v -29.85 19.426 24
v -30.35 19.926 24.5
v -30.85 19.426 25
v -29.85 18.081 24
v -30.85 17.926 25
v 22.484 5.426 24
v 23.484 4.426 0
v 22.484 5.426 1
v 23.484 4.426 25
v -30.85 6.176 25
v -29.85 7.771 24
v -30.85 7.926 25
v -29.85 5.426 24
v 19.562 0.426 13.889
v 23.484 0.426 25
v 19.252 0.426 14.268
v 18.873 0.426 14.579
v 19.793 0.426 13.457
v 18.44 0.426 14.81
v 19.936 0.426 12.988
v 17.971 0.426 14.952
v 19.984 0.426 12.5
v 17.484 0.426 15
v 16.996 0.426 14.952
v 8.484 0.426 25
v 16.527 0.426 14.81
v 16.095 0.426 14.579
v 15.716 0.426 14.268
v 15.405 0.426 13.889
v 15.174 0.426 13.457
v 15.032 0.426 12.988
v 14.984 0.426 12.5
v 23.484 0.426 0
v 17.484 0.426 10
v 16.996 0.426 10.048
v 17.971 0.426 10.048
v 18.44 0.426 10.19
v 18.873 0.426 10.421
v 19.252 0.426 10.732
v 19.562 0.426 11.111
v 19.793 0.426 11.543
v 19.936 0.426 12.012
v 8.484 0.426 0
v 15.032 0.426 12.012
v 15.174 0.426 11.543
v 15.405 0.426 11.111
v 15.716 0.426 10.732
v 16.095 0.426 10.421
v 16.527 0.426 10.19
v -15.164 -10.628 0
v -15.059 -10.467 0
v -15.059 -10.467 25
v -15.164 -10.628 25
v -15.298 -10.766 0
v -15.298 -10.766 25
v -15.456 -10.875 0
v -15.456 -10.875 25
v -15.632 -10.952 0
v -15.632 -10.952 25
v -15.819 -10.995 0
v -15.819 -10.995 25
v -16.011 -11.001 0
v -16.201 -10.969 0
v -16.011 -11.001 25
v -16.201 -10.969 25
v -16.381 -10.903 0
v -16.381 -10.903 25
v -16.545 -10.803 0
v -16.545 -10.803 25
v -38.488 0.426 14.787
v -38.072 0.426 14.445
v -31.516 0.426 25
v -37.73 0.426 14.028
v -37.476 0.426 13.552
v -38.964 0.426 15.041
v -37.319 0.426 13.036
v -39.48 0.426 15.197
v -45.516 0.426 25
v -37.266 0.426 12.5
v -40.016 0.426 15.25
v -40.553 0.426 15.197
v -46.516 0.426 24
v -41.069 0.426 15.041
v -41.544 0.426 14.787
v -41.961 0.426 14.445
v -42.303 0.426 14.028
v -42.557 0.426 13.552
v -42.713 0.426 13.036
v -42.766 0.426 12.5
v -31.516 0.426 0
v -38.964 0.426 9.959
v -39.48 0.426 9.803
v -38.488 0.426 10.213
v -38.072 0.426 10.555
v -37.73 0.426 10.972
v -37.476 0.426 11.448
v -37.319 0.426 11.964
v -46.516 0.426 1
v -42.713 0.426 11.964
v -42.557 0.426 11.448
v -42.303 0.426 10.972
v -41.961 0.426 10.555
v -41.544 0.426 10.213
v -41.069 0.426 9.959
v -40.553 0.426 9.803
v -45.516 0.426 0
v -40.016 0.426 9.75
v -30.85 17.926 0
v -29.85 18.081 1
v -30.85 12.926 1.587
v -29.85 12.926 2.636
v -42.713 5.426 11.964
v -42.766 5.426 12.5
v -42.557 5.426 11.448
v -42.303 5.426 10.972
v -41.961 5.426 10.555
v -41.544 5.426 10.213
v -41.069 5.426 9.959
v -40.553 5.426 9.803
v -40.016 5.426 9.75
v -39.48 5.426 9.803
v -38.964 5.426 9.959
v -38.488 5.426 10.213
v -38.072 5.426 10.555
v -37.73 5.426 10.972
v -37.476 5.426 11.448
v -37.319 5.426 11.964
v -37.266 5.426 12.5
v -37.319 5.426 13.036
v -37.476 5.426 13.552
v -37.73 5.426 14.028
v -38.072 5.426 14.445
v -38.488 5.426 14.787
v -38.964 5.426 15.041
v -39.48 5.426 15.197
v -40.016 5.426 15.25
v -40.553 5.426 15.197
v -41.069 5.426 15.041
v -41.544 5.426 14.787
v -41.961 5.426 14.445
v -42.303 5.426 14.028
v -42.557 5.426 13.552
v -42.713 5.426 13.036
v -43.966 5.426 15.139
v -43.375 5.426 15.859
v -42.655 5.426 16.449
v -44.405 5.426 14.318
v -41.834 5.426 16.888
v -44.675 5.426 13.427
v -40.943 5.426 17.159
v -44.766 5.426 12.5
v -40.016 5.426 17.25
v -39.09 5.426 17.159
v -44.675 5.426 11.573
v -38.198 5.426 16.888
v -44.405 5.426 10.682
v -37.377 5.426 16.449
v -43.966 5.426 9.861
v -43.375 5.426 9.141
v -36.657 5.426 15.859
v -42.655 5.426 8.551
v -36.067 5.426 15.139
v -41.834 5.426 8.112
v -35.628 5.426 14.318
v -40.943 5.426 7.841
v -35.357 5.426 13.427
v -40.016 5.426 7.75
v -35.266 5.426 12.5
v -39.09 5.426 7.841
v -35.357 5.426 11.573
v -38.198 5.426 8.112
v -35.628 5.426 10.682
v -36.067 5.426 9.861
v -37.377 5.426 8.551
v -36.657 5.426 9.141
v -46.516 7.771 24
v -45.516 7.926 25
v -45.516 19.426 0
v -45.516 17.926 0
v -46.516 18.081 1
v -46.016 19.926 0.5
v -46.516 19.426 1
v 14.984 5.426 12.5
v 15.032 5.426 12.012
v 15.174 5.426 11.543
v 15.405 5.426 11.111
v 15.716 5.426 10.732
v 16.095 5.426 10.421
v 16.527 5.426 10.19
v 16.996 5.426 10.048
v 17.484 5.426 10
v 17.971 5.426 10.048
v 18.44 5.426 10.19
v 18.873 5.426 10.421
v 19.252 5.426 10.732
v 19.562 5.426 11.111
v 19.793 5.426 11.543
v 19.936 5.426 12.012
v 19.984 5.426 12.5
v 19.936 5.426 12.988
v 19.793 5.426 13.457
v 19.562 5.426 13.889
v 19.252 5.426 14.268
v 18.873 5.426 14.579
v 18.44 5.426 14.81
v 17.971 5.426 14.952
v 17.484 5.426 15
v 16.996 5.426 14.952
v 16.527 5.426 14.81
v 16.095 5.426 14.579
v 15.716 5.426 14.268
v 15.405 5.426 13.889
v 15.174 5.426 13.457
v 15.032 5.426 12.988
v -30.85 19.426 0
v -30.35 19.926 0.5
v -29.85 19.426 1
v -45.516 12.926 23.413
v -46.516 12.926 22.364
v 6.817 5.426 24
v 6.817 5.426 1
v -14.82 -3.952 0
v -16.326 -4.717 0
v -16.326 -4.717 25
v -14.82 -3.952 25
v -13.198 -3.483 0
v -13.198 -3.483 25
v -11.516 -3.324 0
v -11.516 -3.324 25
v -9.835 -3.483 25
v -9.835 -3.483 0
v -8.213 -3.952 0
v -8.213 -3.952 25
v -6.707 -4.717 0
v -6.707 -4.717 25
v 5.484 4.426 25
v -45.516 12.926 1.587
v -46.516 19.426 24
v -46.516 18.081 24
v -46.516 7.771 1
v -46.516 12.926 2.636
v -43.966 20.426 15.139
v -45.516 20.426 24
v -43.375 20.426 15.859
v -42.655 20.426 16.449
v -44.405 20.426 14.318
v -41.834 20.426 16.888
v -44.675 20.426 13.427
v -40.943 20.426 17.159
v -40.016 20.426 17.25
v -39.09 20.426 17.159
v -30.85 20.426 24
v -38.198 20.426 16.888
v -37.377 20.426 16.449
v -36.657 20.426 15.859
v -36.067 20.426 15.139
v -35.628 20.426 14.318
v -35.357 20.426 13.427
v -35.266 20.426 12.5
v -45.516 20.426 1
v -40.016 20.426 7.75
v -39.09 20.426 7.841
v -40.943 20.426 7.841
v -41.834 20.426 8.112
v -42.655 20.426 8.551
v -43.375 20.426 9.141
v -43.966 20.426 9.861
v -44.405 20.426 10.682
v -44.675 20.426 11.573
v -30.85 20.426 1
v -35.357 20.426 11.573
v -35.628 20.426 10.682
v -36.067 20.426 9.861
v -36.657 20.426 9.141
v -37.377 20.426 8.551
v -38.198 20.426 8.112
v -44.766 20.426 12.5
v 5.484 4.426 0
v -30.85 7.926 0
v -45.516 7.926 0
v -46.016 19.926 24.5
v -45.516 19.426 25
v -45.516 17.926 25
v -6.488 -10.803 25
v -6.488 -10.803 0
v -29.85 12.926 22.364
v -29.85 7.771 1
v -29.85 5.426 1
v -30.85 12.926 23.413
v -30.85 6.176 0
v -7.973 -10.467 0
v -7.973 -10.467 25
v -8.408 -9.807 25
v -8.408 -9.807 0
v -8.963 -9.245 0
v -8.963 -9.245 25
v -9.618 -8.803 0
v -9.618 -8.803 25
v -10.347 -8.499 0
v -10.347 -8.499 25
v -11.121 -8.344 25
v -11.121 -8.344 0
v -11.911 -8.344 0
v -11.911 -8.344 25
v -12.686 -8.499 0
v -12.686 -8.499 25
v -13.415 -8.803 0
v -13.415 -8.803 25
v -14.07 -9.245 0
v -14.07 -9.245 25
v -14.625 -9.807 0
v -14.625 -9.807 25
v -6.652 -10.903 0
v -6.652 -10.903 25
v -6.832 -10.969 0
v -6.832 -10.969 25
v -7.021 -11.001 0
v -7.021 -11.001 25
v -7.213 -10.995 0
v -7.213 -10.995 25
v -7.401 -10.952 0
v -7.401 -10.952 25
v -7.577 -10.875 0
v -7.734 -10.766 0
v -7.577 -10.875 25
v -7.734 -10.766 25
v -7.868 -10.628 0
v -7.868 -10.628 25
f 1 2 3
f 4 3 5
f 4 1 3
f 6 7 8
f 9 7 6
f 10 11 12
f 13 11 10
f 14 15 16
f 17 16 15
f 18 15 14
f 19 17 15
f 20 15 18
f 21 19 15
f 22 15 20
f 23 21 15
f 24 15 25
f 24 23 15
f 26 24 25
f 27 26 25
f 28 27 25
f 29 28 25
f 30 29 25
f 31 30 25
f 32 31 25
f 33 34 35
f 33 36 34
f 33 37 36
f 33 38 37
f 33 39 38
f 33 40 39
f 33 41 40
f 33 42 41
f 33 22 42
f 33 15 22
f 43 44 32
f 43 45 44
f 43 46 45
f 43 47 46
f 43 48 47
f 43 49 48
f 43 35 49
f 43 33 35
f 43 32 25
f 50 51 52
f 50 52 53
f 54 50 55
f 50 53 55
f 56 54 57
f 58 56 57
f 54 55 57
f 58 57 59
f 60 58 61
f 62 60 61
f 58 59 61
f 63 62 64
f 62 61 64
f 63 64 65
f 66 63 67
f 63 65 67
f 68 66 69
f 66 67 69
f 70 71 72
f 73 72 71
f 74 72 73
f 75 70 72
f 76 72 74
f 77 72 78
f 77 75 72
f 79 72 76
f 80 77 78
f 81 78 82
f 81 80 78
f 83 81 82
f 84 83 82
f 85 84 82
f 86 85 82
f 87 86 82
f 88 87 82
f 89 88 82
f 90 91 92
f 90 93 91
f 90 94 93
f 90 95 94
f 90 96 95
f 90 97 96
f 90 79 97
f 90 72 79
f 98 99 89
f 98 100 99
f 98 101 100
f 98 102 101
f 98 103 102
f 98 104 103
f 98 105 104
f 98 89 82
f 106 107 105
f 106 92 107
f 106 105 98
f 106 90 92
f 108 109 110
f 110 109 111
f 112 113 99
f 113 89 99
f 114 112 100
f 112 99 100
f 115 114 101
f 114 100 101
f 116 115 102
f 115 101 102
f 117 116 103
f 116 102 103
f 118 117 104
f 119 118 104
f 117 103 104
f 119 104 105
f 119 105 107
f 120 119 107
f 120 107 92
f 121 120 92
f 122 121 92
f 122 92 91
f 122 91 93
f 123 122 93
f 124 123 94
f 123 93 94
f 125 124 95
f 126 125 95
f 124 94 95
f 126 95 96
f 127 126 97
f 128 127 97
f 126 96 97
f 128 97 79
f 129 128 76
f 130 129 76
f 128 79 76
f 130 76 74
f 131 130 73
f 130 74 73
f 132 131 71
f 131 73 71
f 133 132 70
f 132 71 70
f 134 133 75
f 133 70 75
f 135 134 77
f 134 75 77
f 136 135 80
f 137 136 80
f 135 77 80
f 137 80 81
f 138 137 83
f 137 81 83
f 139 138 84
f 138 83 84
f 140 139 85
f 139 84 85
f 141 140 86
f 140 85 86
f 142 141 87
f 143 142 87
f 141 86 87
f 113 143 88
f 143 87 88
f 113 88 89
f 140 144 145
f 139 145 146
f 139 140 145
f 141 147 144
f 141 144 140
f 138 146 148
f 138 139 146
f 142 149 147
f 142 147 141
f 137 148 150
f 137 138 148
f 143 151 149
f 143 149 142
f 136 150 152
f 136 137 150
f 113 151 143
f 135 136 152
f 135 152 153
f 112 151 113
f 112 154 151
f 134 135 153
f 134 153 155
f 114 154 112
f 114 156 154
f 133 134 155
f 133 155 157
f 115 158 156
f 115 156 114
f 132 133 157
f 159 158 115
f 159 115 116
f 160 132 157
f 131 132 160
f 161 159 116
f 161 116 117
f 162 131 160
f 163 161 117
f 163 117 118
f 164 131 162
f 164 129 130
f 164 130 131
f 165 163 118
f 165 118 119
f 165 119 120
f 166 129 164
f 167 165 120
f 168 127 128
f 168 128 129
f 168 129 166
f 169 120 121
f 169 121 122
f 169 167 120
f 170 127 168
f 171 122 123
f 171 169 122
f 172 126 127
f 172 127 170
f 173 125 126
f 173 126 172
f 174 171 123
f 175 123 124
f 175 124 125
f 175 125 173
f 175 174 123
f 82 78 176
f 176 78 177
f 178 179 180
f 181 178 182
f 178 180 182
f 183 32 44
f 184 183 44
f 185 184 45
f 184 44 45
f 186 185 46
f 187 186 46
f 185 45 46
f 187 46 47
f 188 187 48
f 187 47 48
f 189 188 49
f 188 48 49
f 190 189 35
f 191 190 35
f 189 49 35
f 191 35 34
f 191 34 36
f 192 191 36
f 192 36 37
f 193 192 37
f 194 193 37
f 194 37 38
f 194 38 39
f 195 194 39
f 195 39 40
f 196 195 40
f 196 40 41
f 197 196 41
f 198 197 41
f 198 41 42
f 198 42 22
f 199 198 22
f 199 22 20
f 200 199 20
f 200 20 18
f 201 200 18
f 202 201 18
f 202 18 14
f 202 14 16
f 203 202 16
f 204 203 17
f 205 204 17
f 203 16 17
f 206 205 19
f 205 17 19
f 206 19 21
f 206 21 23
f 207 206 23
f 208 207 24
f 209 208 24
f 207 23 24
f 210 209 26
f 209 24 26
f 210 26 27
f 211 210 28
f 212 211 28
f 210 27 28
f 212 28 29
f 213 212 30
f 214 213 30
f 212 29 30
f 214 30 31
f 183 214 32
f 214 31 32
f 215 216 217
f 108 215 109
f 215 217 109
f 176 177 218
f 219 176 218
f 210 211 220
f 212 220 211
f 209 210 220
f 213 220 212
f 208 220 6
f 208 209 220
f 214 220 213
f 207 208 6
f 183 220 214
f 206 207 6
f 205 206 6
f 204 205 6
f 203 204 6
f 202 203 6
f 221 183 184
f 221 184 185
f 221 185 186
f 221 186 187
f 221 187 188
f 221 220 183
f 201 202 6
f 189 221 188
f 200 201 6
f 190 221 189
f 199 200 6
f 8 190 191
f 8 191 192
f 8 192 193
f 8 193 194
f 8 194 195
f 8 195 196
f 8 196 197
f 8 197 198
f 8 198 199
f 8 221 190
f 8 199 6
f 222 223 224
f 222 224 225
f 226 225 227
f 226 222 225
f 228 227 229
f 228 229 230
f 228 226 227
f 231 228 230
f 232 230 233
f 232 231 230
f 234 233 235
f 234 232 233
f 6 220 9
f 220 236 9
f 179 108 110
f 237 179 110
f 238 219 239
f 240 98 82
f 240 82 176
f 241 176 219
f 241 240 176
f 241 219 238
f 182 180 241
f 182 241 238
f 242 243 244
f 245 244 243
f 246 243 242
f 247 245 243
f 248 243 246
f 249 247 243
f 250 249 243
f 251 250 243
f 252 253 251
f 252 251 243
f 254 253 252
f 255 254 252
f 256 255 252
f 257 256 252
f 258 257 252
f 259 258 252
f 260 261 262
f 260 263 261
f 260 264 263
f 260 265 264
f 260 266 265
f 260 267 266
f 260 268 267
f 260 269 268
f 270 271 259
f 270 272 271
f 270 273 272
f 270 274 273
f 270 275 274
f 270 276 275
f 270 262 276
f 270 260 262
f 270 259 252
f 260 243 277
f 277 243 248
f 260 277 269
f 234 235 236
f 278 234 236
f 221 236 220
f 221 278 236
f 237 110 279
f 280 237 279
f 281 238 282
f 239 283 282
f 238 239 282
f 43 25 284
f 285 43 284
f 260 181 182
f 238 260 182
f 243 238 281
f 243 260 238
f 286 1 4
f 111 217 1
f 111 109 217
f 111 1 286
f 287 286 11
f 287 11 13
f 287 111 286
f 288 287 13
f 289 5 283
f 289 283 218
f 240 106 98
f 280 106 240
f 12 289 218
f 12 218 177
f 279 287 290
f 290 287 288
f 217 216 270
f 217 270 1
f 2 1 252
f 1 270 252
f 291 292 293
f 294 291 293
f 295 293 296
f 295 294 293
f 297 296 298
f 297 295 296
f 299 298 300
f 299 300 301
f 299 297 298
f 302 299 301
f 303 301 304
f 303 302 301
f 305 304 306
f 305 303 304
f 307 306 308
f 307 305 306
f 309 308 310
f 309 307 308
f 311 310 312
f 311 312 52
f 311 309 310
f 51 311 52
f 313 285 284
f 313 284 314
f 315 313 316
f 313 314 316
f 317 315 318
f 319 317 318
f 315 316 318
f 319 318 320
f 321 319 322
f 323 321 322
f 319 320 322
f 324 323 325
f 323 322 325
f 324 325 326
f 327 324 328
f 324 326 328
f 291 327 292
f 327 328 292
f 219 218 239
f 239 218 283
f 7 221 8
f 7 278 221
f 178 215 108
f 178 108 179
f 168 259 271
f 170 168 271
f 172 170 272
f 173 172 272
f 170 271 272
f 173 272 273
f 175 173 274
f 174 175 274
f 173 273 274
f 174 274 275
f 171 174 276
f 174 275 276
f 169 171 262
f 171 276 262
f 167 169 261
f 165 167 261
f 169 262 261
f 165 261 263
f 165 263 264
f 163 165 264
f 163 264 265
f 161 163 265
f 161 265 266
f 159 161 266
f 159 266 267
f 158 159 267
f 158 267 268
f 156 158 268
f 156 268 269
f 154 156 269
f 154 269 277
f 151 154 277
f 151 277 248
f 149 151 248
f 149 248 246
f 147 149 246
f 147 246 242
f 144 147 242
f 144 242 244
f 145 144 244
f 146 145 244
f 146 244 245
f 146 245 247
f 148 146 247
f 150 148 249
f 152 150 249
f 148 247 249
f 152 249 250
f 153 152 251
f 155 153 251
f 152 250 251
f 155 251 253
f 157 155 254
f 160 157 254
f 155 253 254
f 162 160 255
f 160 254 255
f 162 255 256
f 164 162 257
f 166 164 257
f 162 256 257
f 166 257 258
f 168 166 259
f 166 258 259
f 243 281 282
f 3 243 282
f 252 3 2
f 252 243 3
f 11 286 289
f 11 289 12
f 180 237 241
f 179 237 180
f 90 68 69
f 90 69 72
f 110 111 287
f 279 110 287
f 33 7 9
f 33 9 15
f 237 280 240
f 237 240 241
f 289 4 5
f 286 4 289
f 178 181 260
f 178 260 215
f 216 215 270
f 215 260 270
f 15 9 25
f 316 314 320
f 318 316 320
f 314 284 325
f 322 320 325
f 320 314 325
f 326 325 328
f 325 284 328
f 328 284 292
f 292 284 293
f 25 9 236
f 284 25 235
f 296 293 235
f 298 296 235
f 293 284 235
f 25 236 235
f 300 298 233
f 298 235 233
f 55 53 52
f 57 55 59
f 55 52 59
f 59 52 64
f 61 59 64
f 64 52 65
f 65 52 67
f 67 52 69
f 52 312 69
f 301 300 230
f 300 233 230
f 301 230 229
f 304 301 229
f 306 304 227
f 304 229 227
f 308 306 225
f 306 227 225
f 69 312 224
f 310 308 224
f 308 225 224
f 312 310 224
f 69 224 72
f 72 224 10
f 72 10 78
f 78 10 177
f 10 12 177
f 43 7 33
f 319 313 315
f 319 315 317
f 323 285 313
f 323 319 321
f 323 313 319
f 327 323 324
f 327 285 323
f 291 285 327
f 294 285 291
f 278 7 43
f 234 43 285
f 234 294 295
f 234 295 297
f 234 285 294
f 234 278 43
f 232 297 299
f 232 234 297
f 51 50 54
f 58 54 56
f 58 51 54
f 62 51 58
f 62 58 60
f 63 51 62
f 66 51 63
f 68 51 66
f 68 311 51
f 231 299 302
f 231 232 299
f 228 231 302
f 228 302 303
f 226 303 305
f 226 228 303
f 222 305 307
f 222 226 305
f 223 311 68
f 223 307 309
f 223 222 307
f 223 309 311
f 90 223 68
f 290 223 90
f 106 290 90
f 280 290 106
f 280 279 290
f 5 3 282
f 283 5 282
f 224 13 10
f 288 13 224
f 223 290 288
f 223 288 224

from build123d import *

# Parameters (mm, degrees)
BOSS_EXTRUDE1_DEPTH                     = 25
FILLET1_R                               = 1
CUT_EXTRUDE2_DEPTH                      = 63.343102097
CBORE_FOR_M5_HEX_HEAD_BOLT1_D           = 5.5
CBORE_FOR_M5_HEX_HEAD_BOLT1_CBORE_D     = 9.5
CBORE_FOR_M5_HEX_HEAD_BOLT1_CBORE_DEPTH = 15
F_5_0_5_DIAMETER_HOLE1_D                = 5
F_5_0_5_DIAMETER_HOLE1_DEPTH            = 15
F_5_0_5_DIAMETER_HOLE1_TIP              = 1.502151548
CHAMFER4_SIZE                           = 1
CHAMFER5_SIZE                           = 1
CHAMFER6_SIZE                           = 1
CHAMFER7_SIZE                           = 1
CHAMFER8_SIZE                           = 1
CHAMFER9_SIZE                           = 1


with BuildPart() as part:
    # Sketch1 → Boss-Extrude1 (new body)
    with BuildSketch(Plane.XY):
        with BuildLine():
            Line((23.483773769, 0.425913311), (8.483773769, 0.425913311))
            Line((8.483773769, 0.425913311), (-7.578534855, -11.620818157))
            ThreePointArc((-7.578534855, -11.620818157), (-11.516226231, -8.324086689), (-15.453917607, -11.620818157))
            Line((-15.453917607, -11.620818157), (-31.516226231, 0.425913311))
            Line((-31.516226231, 0.425913311), (-46.516226231, 0.425913311))
            Line((-46.516226231, 0.425913311), (-46.516226231, 20.425913311))
            Line((-46.516226231, 20.425913311), (-29.849559564, 20.425913311))
            Line((-29.849559564, 20.425913311), (-29.849559564, 5.425913311))
            Line((-29.849559564, 5.425913311), (-16.325743301, -4.716948887))
            ThreePointArc((-16.325743301, -4.716948887), (-11.516226231, -3.324086689), (-6.706709161, -4.716948887))
            Line((-6.706709161, -4.716948887), (6.817107102, 5.425913311))
            Line((6.817107102, 5.425913311), (23.483773769, 5.425913311))
            Line((23.483773769, 5.425913311), (23.483773769, 0.425913311))
        make_face()
    extrude(amount=BOSS_EXTRUDE1_DEPTH)

    # Fillet1
    fillet1_edges = [part.edges().sort_by_distance(p)[0] for p in [
        (-7.578534855, -11.620818157, 12.5),
        (-15.453917607, -11.620818157, 12.5),
    ]]
    fillet(fillet1_edges, radius=FILLET1_R)

    # Sketch5 → Cut-Extrude2 (cut, through all)
    with BuildSketch(Plane(origin=(-29.849559564, 0, 0), x_dir=(0, 0, -1), z_dir=(1, 0, 0))):
        Polygon((0, 7.925913311), (0, 17.925913311), (-1.586948369, 12.925913311), align=None)
        Polygon((-25, 7.925913311), (-25, 17.925913311), (-23.413051631, 12.925913311), align=None)
    extrude(amount=-CUT_EXTRUDE2_DEPTH, mode=Mode.SUBTRACT)

    # CBORE for M5 Hex Head Bolt1 (through all)
    with Locations(Plane(origin=(0, 20.425913311, 0), x_dir=(1, 0, 0), z_dir=(0, 1, 0))):
        with Locations((-40.016226231, -12.5)):
            CounterBoreHole(CBORE_FOR_M5_HEX_HEAD_BOLT1_D / 2, CBORE_FOR_M5_HEX_HEAD_BOLT1_CBORE_D / 2, CBORE_FOR_M5_HEX_HEAD_BOLT1_CBORE_DEPTH)

    # Ø5.0 (5) Diameter Hole1
    with Locations(Plane(origin=(0, 5.425913311, 0), x_dir=(1, 0, 0), z_dir=(0, 1, 0))):
        with Locations((17.483773769, -12.5)):
            Hole(F_5_0_5_DIAMETER_HOLE1_D / 2, depth=F_5_0_5_DIAMETER_HOLE1_DEPTH)
            with Locations((0, 0, -(F_5_0_5_DIAMETER_HOLE1_DEPTH + F_5_0_5_DIAMETER_HOLE1_TIP / 2))):  # 118° drill point
                Cone(0, F_5_0_5_DIAMETER_HOLE1_D / 2, F_5_0_5_DIAMETER_HOLE1_TIP, mode=Mode.SUBTRACT)

    # Chamfer4
    chamfer4_edges = [part.edges().sort_by_distance(p)[0] for p in [
        (-46.516226231, 20.425913311, 12.5),
        (-29.849559564, 20.425913311, 12.5),
    ]]
    chamfer(chamfer4_edges, length=CHAMFER4_SIZE)

    # Chamfer5
    chamfer5_edges = [part.edges().sort_by_distance(p)[0] for p in [
        (-38.182892898, 20.425913311, 25),
        (-38.182892898, 20.425913311, 0),
    ]]
    chamfer(chamfer5_edges, length=CHAMFER5_SIZE)

    # Chamfer6
    chamfer6_edges = [part.edges().sort_by_distance(p)[0] for p in [
        (-46.516226231, 4.175913311, 0),
        (-46.516226231, 15.425913311, 0.793474184),
        (-46.516226231, 10.425913311, 0.793474184),
        (-46.516226231, 18.675913311, 0),
    ]]
    chamfer(chamfer6_edges, length=CHAMFER6_SIZE)

    # Chamfer7
    chamfer7_edges = [part.edges().sort_by_distance(p)[0] for p in [
        (-46.516226231, 4.175913311, 25),
        (-46.516226231, 10.425913311, 24.206525816),
        (-46.516226231, 15.425913311, 24.206525816),
        (-46.516226231, 18.675913311, 25),
    ]]
    chamfer(chamfer7_edges, length=CHAMFER7_SIZE)

    # Chamfer8
    chamfer8_edges = [part.edges().sort_by_distance(p)[0] for p in [
        (-29.849559564, 6.675913311, 0),
        (-29.849559564, 6.675913311, 25),
        (-29.849559564, 18.675913311, 0),
        (-29.849559564, 18.675913311, 25),
        (-29.849559564, 15.425913311, 0.793474184),
        (-29.849559564, 10.425913311, 0.793474184),
        (-29.849559564, 10.425913311, 24.206525816),
        (-29.849559564, 15.425913311, 24.206525816),
    ]]
    chamfer(chamfer8_edges, length=CHAMFER8_SIZE)

    # Chamfer9
    chamfer9_edges = [part.edges().sort_by_distance(p)[0] for p in [
        (15.150440436, 5.425913311, 0),
        (23.483773769, 5.425913311, 12.5),
        (15.150440436, 5.425913311, 25),
    ]]
    chamfer(chamfer9_edges, length=CHAMFER9_SIZE)


solid = part.part
